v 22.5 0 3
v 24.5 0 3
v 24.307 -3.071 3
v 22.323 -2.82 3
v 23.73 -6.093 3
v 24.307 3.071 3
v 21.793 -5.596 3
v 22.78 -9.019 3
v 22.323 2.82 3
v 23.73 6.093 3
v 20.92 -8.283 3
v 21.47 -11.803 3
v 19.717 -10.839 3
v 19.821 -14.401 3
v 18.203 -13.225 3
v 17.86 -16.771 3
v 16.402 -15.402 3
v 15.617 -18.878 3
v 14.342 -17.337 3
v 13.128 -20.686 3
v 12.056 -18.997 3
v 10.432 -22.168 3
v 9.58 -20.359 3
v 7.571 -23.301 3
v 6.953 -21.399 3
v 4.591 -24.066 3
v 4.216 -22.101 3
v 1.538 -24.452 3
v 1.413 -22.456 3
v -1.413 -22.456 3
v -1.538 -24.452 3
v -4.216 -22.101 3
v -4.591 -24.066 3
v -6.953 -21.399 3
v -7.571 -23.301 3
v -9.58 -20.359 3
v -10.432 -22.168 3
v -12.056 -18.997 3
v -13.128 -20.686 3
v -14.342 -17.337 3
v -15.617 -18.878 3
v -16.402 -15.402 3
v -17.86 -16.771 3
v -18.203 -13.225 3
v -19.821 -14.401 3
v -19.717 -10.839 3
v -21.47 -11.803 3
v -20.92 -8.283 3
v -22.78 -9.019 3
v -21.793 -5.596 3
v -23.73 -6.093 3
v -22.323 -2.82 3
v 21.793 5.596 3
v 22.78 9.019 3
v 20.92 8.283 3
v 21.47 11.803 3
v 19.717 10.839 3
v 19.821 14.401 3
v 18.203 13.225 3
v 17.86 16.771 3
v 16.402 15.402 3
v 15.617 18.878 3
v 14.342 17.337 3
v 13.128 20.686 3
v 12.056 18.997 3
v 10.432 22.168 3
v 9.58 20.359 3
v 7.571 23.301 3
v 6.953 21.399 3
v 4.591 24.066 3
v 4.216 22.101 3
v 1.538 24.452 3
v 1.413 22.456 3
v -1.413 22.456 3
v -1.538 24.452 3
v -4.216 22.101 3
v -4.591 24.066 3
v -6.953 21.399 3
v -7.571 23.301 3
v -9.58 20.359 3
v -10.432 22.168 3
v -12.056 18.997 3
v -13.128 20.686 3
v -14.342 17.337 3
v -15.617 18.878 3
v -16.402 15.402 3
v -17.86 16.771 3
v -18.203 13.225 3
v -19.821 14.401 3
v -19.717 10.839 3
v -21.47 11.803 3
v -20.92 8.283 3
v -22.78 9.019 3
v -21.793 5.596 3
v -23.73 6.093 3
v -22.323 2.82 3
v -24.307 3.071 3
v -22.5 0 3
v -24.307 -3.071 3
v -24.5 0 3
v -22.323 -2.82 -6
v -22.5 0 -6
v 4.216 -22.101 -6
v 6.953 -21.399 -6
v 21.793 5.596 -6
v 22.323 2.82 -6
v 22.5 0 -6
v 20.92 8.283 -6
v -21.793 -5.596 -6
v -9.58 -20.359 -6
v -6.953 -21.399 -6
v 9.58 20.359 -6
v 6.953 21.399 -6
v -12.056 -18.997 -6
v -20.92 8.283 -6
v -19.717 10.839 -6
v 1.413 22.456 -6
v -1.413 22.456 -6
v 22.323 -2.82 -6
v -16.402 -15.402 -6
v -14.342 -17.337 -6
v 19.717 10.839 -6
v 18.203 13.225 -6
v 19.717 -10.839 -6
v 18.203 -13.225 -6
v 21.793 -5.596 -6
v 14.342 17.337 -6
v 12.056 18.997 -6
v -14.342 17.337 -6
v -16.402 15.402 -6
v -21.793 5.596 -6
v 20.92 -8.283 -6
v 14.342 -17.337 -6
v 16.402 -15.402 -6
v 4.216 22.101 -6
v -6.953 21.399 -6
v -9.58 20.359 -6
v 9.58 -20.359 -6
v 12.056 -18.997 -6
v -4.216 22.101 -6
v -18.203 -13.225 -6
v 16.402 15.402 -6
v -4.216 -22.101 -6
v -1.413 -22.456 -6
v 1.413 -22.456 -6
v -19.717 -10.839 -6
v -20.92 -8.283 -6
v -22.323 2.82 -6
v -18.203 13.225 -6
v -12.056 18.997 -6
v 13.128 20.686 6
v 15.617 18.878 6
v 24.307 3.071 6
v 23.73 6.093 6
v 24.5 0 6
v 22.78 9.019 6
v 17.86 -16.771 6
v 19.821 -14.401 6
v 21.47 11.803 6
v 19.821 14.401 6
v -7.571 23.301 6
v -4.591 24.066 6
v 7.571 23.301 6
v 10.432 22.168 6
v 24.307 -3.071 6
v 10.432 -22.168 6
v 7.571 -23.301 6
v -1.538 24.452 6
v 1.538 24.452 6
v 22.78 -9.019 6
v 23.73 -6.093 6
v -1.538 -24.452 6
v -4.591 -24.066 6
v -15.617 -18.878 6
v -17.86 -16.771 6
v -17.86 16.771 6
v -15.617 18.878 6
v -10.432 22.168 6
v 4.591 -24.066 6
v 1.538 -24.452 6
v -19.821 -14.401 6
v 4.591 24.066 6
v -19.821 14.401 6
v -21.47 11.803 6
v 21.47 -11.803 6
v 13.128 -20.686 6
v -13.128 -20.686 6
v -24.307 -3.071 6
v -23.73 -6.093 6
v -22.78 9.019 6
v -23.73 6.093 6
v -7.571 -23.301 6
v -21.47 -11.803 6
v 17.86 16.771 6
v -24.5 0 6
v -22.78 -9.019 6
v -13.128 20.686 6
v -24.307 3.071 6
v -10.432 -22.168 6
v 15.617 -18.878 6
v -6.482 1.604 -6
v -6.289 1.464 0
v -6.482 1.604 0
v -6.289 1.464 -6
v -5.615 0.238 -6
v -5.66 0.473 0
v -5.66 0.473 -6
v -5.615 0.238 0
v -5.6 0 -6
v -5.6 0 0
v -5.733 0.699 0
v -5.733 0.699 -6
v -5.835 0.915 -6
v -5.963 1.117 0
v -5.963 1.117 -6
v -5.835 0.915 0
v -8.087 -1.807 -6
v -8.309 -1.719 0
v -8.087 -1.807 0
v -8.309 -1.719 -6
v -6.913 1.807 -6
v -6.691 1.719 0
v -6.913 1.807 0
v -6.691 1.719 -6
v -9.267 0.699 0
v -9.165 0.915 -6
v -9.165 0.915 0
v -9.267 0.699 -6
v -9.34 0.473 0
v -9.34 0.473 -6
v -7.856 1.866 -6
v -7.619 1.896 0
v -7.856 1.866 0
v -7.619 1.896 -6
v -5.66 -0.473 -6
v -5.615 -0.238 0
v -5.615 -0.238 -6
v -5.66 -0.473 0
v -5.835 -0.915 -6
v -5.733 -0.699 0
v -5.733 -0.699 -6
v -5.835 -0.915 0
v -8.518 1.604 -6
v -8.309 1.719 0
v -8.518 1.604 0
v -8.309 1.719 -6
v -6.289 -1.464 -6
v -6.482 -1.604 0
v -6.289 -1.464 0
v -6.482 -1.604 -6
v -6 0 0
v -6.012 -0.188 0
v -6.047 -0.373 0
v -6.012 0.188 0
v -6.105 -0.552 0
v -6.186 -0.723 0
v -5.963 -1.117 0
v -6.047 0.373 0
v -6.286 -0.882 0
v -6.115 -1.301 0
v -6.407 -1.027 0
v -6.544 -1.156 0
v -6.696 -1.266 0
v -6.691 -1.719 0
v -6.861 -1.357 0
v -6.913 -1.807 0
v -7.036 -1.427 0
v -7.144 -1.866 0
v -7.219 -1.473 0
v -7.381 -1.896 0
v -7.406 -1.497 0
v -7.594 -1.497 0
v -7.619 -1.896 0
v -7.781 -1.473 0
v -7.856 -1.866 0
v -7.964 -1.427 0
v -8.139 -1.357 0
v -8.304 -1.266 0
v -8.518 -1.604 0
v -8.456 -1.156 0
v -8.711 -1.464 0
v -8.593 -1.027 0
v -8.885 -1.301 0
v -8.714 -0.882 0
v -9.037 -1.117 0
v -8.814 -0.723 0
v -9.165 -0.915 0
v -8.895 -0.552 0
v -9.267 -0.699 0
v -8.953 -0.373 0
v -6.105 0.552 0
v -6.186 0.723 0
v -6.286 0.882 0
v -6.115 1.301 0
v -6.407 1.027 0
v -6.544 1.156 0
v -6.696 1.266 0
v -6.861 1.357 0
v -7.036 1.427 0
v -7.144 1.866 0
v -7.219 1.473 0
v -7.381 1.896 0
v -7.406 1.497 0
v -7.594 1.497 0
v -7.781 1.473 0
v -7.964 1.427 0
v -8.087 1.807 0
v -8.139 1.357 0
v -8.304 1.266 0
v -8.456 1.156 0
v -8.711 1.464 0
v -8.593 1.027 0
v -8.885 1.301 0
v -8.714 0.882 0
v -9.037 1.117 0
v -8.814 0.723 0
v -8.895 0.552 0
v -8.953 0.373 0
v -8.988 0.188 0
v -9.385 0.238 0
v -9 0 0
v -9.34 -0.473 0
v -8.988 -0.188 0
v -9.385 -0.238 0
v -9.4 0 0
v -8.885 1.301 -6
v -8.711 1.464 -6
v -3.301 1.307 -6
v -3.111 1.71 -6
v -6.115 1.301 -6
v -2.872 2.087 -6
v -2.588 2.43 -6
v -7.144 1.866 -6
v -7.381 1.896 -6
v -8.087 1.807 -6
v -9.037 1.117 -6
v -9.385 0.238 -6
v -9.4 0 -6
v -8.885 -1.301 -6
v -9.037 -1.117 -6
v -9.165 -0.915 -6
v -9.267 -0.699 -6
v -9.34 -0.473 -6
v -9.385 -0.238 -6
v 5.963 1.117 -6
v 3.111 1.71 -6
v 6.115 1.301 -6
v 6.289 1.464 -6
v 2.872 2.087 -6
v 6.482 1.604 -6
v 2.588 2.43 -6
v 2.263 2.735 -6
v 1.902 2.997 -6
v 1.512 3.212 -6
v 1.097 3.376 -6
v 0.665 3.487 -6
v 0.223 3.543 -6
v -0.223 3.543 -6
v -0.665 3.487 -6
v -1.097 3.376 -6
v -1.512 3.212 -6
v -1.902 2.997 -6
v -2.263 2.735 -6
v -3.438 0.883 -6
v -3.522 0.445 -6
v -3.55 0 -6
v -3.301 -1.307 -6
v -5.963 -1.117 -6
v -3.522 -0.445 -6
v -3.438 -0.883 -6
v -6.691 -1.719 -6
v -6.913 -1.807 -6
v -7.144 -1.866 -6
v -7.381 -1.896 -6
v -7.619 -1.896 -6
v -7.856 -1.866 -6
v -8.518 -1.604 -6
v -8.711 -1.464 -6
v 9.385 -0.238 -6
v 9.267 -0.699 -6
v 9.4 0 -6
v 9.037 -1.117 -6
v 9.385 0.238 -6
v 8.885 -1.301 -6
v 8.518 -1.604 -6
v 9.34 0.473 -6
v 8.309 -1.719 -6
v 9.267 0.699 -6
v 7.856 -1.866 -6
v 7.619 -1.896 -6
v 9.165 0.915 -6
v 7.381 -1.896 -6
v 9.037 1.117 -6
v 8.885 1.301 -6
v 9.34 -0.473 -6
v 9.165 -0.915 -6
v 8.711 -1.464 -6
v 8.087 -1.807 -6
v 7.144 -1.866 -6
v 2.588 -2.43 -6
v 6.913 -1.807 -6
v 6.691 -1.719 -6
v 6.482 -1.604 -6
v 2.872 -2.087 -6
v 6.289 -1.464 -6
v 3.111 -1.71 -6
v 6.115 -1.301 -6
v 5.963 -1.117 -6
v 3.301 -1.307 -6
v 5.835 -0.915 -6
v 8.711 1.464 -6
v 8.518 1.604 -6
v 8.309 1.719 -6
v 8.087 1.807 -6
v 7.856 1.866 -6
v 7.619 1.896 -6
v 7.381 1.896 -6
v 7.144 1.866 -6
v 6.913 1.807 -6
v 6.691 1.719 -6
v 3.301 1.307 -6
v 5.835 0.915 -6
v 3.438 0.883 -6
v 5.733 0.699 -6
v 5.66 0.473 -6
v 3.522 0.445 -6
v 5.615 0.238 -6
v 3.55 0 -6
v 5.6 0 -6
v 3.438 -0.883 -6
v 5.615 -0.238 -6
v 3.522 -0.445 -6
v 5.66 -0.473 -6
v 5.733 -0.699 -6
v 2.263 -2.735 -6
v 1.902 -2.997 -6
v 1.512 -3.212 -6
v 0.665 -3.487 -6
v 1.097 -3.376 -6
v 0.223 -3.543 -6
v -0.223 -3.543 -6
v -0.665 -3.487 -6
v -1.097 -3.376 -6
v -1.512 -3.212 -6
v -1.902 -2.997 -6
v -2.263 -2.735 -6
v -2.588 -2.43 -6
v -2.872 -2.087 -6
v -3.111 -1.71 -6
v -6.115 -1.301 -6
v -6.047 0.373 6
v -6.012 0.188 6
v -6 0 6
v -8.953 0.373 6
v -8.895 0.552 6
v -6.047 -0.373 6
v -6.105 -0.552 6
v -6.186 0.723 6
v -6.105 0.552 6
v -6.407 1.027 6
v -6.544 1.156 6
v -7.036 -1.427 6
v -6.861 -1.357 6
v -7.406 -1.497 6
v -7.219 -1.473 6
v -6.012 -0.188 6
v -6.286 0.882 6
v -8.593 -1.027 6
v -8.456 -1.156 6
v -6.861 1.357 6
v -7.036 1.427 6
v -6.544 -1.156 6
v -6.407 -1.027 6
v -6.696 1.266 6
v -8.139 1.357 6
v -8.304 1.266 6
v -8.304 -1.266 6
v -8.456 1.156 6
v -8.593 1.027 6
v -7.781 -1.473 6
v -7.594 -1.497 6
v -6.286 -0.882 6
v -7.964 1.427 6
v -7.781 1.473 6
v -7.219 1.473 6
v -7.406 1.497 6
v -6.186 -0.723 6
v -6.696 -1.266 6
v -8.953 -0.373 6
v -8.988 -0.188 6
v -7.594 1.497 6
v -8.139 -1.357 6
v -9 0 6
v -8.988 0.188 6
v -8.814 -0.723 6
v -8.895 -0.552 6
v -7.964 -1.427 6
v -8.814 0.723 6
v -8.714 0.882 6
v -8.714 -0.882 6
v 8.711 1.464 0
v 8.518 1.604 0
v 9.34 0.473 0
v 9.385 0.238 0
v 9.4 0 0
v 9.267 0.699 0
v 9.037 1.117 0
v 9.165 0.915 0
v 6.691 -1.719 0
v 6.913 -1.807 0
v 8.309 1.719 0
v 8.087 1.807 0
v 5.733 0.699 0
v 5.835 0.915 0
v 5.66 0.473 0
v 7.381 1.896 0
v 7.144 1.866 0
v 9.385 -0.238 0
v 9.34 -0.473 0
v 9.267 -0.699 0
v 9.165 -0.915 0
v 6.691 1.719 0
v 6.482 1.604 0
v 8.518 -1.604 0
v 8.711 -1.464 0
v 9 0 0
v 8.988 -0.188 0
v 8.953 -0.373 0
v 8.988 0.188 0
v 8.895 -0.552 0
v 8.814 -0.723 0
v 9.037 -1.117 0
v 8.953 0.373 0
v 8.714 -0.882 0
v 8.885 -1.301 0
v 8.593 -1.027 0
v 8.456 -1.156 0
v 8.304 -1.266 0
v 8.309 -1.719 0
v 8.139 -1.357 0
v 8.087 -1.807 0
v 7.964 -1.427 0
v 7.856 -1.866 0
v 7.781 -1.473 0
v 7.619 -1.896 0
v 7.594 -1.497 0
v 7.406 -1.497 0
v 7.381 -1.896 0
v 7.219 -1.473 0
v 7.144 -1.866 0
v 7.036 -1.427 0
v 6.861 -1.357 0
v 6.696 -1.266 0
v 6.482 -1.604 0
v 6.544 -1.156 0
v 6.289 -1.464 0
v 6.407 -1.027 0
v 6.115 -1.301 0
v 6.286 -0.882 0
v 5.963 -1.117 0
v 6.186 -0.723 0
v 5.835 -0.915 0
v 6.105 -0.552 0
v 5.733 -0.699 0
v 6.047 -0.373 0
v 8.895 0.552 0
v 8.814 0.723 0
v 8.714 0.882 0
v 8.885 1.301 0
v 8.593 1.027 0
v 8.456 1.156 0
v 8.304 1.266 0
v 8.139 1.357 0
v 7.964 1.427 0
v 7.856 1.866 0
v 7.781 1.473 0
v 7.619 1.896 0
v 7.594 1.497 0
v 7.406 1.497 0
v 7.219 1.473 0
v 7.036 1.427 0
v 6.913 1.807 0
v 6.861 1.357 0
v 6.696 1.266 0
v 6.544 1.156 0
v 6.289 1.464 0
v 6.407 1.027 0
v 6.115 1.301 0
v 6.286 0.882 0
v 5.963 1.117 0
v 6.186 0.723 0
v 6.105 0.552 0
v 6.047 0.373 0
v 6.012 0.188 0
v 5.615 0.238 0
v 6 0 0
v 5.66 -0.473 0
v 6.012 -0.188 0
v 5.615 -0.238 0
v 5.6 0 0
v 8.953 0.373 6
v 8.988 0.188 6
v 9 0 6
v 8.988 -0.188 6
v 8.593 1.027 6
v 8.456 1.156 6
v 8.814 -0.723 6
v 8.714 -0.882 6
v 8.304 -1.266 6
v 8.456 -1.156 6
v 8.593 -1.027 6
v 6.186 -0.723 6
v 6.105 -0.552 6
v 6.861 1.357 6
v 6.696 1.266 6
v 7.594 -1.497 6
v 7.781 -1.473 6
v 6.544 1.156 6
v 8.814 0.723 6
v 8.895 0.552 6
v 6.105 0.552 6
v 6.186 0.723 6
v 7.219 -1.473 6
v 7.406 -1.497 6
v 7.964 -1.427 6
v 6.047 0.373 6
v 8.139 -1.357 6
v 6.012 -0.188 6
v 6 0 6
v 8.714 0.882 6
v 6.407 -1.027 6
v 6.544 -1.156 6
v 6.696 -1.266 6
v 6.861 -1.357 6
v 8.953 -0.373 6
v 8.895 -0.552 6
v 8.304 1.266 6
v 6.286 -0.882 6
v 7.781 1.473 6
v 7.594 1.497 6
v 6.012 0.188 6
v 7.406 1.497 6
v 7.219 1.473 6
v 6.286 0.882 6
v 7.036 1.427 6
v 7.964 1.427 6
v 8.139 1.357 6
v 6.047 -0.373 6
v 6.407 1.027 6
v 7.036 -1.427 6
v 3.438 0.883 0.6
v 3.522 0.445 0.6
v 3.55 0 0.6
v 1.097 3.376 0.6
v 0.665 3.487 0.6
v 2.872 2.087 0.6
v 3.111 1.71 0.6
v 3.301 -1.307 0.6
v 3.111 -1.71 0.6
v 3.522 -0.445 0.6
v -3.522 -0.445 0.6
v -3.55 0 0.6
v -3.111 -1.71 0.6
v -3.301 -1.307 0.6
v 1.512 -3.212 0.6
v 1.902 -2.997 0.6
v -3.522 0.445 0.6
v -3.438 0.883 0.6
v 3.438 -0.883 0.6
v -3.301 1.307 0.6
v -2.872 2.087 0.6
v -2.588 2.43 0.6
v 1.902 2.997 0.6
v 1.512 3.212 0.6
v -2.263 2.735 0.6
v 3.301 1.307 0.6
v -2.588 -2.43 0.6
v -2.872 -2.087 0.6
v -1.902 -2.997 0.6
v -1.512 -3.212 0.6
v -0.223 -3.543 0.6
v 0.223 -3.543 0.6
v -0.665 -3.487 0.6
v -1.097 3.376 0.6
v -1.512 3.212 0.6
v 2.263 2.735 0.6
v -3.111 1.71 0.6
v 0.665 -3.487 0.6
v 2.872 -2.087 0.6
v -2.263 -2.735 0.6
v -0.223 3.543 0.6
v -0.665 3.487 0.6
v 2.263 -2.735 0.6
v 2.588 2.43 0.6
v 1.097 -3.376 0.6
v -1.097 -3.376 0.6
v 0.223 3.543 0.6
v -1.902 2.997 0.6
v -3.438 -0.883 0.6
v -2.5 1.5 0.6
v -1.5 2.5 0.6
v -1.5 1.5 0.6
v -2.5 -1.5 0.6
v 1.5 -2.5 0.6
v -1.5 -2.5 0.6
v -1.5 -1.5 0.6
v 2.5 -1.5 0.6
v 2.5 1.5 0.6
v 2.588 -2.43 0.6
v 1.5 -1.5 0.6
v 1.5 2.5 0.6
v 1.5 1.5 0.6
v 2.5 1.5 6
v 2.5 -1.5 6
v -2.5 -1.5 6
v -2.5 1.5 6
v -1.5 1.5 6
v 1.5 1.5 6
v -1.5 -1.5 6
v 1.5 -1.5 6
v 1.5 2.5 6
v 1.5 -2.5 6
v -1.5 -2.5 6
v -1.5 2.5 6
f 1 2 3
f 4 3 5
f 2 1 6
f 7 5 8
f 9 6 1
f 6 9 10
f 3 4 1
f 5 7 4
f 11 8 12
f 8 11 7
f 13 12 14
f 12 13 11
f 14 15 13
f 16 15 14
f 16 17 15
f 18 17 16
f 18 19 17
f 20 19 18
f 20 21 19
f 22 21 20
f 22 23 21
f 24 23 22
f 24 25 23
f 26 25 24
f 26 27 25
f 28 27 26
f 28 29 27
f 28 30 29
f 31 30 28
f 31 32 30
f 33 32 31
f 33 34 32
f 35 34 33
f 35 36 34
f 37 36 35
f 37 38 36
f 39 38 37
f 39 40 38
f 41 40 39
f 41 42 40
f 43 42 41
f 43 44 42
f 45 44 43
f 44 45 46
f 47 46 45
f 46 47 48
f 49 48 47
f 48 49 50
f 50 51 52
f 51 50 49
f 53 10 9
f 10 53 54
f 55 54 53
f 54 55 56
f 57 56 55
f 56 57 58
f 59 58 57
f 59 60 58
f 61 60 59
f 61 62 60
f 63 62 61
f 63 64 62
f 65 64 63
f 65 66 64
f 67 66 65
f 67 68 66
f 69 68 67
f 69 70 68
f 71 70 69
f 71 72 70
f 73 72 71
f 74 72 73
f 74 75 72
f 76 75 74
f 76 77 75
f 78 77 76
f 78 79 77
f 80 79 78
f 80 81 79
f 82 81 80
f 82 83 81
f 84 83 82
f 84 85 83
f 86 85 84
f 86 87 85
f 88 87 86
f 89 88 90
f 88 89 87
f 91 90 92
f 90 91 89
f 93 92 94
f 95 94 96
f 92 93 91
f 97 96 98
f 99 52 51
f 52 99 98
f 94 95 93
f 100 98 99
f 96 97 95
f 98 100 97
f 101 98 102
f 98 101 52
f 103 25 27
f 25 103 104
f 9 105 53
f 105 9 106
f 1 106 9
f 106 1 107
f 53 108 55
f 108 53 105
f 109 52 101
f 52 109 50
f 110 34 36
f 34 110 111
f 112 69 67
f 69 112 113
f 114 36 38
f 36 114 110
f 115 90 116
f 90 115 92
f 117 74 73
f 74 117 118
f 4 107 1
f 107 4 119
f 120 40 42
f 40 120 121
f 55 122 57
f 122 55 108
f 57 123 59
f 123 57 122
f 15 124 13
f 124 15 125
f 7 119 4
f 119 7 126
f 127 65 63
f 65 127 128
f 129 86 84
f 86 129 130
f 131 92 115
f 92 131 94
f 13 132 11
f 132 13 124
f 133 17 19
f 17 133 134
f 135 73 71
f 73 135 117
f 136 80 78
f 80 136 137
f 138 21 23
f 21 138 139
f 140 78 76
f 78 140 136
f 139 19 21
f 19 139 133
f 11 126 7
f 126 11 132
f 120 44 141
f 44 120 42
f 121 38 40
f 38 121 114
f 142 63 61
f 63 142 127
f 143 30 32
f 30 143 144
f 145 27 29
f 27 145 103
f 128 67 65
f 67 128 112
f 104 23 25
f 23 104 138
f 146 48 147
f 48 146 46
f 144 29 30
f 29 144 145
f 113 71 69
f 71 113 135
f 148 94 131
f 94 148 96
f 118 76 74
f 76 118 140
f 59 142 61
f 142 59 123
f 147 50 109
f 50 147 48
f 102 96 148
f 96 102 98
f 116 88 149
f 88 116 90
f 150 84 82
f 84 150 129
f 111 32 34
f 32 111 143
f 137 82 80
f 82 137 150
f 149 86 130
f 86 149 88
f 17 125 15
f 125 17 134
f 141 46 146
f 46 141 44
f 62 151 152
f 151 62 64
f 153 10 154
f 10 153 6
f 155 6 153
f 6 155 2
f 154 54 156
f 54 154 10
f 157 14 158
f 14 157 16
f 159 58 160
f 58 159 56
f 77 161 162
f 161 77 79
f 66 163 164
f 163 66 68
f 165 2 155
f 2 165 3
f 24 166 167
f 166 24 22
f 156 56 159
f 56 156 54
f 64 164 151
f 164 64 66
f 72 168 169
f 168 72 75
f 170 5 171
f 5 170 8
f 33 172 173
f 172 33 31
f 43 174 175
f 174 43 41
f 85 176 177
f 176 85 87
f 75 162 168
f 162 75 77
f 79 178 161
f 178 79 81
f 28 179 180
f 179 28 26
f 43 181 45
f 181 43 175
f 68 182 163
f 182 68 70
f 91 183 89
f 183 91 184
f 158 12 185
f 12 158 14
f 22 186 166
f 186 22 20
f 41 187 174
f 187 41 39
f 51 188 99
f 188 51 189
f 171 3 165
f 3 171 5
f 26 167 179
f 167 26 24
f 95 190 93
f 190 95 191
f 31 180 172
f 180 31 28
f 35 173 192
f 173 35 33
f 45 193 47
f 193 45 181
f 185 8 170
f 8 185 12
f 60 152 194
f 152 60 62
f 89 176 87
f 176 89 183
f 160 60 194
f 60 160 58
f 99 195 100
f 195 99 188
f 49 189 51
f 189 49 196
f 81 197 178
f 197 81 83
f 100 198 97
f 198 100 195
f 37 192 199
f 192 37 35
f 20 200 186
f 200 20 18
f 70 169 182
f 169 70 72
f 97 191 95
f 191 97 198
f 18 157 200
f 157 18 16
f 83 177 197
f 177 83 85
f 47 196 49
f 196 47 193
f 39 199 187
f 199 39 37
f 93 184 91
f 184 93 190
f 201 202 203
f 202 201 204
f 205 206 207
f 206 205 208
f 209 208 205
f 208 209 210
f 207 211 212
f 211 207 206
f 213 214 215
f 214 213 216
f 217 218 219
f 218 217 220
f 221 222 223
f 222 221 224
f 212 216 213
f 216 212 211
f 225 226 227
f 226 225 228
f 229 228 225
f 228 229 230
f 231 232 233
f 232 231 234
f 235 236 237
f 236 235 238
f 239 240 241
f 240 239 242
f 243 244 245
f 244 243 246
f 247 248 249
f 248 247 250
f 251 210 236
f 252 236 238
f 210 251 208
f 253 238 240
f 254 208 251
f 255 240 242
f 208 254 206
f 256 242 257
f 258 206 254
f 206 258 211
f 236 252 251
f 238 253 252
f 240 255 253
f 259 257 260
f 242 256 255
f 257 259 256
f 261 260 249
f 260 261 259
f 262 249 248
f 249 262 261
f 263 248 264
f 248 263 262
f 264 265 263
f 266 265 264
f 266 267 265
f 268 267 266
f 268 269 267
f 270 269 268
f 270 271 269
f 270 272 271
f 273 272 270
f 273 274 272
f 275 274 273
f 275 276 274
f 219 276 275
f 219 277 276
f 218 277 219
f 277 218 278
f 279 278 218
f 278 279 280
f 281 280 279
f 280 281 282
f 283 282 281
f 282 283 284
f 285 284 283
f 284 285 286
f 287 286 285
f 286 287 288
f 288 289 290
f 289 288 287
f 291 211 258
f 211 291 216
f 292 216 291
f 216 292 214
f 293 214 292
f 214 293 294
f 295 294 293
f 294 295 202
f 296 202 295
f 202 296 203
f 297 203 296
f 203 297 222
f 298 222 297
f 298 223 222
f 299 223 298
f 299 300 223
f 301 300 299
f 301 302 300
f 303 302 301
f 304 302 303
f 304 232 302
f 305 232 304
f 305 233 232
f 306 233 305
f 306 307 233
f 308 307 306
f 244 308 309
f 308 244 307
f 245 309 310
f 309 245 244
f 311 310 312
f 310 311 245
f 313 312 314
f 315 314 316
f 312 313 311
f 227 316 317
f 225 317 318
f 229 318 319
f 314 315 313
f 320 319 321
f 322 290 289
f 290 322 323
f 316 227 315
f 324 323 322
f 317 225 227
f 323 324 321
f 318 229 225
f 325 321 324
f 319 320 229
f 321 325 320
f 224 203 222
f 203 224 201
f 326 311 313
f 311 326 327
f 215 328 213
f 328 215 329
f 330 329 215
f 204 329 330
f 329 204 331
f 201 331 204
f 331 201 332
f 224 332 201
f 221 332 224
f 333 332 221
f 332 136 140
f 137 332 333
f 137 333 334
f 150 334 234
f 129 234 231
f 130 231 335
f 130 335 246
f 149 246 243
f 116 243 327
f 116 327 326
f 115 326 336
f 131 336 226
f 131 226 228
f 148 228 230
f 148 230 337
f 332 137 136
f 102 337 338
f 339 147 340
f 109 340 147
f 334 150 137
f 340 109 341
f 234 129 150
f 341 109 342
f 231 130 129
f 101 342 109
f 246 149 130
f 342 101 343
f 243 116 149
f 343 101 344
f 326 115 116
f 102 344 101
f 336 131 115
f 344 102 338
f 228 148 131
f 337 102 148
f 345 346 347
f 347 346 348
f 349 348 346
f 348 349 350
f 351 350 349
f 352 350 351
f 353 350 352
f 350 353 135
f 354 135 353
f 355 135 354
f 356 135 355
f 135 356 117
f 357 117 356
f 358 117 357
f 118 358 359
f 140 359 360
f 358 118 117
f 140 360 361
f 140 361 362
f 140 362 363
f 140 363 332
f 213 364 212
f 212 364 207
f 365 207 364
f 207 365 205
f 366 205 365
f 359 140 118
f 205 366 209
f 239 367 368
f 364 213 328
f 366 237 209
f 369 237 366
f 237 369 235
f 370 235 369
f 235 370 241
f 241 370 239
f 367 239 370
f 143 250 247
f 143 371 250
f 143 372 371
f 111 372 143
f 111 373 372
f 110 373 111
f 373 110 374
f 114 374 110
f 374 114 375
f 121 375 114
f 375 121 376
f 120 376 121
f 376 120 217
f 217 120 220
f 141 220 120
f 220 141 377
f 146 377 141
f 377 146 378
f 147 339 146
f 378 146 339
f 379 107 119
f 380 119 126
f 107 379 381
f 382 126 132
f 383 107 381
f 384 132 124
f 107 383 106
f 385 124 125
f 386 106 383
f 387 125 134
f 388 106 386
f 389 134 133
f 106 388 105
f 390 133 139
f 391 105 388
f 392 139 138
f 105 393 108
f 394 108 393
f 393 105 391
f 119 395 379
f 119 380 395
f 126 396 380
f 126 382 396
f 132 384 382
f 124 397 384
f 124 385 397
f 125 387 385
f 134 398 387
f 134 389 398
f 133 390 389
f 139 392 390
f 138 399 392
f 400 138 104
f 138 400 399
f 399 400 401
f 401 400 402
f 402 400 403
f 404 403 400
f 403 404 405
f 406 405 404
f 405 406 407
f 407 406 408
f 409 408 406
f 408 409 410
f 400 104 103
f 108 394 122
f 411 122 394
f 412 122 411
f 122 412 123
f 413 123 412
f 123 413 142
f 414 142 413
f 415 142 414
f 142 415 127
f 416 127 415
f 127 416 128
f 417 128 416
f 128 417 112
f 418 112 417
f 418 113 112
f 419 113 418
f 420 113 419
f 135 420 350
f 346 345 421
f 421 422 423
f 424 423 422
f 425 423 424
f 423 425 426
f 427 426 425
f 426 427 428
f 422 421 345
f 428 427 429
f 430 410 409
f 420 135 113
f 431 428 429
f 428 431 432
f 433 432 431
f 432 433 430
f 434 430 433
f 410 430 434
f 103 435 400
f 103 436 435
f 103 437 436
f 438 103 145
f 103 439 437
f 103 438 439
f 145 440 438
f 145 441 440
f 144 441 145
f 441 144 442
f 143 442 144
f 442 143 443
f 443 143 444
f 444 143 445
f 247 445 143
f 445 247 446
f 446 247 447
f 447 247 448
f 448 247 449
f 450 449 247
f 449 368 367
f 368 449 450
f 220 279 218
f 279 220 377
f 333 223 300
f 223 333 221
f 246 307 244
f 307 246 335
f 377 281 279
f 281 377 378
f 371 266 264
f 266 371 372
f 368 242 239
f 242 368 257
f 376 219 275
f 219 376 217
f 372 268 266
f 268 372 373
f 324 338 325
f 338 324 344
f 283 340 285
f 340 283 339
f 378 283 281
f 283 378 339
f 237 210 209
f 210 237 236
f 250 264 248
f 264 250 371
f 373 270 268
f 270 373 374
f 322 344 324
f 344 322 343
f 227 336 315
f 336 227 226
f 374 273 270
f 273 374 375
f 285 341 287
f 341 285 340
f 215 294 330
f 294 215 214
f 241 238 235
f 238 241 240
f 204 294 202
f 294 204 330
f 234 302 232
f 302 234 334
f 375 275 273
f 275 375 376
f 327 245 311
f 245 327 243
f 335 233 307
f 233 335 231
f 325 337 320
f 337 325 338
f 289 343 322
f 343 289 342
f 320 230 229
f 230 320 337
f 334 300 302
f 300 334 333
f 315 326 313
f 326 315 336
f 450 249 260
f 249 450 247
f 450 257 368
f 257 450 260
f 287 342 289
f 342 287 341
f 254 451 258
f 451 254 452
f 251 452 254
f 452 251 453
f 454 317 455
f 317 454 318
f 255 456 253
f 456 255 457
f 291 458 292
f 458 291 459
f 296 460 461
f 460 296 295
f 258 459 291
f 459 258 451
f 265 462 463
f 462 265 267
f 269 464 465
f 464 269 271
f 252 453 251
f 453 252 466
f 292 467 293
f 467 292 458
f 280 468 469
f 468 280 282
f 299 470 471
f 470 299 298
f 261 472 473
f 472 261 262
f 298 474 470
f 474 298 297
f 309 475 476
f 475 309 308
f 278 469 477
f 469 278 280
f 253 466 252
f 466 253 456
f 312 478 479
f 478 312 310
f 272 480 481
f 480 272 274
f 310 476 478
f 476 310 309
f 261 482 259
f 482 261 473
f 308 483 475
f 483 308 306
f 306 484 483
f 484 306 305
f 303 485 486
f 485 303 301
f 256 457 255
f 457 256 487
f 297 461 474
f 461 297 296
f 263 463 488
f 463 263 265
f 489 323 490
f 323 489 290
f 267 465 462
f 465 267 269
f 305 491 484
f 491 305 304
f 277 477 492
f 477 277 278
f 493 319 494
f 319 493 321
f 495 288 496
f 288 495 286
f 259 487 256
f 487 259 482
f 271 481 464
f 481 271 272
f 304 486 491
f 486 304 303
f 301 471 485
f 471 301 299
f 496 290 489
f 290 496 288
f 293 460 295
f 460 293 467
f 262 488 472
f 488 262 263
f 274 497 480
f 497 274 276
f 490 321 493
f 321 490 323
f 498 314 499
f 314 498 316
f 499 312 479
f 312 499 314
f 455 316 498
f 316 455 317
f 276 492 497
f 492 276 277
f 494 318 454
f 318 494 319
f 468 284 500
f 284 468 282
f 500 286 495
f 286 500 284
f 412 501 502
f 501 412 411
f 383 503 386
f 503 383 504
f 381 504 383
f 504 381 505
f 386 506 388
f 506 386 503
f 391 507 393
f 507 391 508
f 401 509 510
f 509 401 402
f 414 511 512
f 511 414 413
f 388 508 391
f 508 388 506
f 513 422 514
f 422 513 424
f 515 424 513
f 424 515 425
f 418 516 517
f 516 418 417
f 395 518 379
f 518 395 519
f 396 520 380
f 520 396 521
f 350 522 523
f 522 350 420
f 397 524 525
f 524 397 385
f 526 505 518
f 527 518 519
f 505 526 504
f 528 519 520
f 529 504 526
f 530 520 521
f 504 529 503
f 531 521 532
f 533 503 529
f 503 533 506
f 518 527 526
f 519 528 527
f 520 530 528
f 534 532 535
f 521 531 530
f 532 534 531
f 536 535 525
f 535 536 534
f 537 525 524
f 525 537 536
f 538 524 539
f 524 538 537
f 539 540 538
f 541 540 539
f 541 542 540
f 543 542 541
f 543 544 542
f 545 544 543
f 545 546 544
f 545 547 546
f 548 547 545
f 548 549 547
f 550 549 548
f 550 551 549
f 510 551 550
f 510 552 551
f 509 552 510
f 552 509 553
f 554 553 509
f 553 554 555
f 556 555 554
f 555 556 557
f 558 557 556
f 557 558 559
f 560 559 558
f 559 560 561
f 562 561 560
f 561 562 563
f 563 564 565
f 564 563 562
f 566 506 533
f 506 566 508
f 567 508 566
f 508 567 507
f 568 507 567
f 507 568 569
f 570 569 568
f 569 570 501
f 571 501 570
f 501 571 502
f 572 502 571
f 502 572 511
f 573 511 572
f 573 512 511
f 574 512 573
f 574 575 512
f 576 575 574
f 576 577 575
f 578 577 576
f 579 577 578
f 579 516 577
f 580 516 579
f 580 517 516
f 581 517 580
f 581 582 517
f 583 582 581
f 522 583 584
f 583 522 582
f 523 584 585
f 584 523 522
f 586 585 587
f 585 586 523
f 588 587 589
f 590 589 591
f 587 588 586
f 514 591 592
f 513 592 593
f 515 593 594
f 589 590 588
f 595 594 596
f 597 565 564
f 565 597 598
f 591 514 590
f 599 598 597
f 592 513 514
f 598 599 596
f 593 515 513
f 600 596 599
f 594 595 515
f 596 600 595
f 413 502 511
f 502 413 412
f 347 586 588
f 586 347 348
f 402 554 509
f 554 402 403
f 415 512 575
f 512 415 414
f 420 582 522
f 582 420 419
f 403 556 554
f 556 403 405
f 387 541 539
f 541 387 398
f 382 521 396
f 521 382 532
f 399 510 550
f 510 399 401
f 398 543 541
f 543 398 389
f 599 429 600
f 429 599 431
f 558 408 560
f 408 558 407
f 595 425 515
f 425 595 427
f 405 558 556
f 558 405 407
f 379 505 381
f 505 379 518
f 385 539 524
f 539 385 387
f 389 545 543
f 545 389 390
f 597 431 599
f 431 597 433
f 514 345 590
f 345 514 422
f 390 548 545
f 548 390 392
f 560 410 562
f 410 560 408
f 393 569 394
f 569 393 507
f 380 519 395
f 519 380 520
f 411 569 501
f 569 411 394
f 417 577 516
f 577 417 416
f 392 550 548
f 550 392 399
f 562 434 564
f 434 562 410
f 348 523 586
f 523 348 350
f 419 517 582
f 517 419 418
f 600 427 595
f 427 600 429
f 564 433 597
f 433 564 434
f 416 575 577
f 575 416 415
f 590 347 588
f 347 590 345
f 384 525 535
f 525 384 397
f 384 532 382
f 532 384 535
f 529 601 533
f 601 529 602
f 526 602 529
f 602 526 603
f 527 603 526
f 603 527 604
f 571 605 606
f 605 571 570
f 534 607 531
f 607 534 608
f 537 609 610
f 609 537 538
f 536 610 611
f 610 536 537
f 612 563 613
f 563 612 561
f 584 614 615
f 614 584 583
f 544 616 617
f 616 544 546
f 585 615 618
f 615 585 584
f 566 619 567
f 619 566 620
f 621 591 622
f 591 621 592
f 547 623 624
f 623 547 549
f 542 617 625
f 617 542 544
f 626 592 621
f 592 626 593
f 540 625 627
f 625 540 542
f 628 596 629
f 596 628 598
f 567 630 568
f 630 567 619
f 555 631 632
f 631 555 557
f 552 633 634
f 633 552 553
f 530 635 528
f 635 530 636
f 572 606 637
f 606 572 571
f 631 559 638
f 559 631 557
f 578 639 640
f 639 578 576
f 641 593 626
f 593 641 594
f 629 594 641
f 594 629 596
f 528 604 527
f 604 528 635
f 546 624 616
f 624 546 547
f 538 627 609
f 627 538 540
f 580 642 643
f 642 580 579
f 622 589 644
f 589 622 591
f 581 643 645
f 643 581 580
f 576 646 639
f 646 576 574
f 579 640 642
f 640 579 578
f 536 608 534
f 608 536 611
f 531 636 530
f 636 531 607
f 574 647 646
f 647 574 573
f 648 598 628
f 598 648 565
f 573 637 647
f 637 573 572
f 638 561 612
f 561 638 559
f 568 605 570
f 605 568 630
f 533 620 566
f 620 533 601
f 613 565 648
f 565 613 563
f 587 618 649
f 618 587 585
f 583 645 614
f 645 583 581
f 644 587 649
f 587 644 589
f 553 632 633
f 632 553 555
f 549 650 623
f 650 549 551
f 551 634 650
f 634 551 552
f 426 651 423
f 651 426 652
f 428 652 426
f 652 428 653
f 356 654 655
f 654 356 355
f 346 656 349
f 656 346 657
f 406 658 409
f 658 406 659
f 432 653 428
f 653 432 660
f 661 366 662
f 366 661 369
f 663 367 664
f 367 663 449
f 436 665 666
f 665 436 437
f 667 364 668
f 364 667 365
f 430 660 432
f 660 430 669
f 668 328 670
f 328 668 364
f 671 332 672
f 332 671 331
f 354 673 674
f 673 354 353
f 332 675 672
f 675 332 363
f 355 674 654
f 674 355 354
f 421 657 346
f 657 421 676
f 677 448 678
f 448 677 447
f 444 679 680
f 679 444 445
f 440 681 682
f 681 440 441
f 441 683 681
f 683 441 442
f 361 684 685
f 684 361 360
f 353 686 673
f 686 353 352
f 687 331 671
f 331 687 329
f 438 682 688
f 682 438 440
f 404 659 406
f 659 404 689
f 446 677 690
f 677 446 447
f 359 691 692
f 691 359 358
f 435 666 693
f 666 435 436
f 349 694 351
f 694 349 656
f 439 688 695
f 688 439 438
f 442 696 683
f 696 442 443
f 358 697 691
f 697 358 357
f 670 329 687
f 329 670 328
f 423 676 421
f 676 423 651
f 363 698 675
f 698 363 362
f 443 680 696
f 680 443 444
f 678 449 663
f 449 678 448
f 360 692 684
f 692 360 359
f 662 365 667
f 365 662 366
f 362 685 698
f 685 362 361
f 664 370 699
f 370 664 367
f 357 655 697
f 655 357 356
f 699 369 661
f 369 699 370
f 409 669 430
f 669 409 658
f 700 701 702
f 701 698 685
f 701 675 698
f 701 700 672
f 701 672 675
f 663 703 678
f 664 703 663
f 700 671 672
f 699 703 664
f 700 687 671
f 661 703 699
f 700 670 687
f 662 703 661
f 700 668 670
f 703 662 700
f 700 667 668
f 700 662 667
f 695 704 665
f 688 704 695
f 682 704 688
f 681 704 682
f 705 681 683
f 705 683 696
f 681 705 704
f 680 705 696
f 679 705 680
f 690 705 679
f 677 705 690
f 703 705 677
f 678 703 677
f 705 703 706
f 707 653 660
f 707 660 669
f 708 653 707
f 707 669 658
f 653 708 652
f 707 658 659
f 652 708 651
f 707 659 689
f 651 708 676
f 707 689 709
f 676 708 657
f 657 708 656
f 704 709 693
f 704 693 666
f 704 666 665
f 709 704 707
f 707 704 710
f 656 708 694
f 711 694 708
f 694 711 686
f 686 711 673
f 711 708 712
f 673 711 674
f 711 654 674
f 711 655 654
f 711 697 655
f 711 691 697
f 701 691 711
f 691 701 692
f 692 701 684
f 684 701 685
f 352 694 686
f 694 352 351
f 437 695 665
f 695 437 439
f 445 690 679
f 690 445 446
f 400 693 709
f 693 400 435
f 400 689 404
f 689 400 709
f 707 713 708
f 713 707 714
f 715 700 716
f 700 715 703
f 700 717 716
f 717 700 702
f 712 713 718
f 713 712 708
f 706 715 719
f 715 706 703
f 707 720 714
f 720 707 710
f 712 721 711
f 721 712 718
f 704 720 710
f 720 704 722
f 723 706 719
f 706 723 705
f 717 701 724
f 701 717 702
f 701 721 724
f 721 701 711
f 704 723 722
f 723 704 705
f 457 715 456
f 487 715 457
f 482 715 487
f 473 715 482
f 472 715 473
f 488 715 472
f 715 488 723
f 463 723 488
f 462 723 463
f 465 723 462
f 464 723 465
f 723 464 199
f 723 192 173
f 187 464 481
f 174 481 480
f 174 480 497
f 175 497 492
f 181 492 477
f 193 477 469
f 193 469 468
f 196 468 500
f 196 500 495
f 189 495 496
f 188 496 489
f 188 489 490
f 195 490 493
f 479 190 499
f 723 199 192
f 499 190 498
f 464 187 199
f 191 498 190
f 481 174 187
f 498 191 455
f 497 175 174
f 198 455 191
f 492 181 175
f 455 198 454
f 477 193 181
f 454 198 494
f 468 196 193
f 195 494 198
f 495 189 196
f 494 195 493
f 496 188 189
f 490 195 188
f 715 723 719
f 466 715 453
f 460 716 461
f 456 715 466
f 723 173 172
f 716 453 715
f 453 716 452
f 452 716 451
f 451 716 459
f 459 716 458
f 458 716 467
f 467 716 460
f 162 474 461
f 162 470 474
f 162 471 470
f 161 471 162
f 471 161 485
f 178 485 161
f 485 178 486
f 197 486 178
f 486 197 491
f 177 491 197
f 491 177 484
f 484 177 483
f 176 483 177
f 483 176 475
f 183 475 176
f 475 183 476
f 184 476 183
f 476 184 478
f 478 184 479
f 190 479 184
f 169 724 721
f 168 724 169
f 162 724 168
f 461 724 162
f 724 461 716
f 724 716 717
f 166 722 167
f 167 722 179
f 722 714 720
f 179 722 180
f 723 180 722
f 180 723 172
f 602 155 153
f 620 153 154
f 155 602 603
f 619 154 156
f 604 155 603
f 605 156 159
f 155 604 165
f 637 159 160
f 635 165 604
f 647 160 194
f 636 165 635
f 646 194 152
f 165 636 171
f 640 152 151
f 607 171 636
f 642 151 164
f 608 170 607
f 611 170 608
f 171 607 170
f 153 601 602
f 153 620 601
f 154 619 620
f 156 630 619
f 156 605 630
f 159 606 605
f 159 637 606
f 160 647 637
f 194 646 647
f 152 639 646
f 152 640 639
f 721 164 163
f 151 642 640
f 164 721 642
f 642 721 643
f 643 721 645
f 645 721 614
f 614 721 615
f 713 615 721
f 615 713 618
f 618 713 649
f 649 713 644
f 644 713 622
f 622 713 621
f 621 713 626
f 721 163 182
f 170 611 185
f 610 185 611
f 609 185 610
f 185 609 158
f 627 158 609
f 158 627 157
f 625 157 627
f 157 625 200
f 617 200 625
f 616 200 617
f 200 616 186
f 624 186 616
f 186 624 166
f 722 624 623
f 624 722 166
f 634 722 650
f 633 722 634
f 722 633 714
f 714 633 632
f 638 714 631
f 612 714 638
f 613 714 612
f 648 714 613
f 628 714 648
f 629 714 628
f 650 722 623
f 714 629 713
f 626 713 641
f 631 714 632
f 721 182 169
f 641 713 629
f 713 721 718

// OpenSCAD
$fn = 50;

difference() {
	union() {
		translate(v = [0, 0, 0]) {
			rotate(a = [0, 0, 0]) {
				difference() {
					union() {
						translate(v = [0, 0, -6.0]) {
							cylinder(h = 12, r = 24.5);
						}
					}
					union() {
						translate(v = [0, 0, 0]) {
							rotate(a = [0, 0, 0]) {
								difference() {
									union() {
										translate(v = [0, 0, -3.0]) {
											cylinder(h = 6, r = 27.5);
										}
									}
									union() {
										translate(v = [0, 0, -3.01]) {
											cylinder(h = 6.02, r = 22.5);
										}
									}
								}
							}
						}
						translate(v = [0, 0, -3]) {
							rotate(a = [0, 0, 0]) {
								difference() {
									union() {
										translate(v = [0, 0, -3.0]) {
											cylinder(h = 6, r = 27.5);
										}
									}
									union() {
										translate(v = [0, 0, -3.01]) {
											cylinder(h = 6.02, r = 22.5);
										}
									}
								}
							}
						}
						translate(v = [0, 0, -6]) {
							rotate(a = [0, 0, 0]) {
								difference() {
									union() {
										translate(v = [0, 0, -3.0]) {
											cylinder(h = 6, r = 27.5);
										}
									}
									union() {
										translate(v = [0, 0, -3.01]) {
											cylinder(h = 6.02, r = 22.5);
										}
									}
								}
							}
						}
						translate(v = [0, 0, 0]) {
							rotate(a = [0, 0, 0]) {
								difference() {
									union() {
										translate(v = [0, 0, -21.0]) {
											cylinder(h = 42, r = 25.5);
										}
									}
									union() {
										translate(v = [0, 0, -21.01]) {
											cylinder(h = 42.02, r = 24.5);
										}
									}
								}
							}
						}
						translate(v = [-30.0, -30.0, -100.0]) {
							cylinder(h = 200, r = 3.0);
						}
						translate(v = [-30.0, -15.0, -100.0]) {
							cylinder(h = 200, r = 3.0);
						}
						translate(v = [-30.0, 15.0, -100.0]) {
							cylinder(h = 200, r = 3.0);
						}
						translate(v = [-30.0, 30.0, -100.0]) {
							cylinder(h = 200, r = 3.0);
						}
						translate(v = [-15.0, -30.0, -100.0]) {
							cylinder(h = 200, r = 3.0);
						}
						translate(v = [-15.0, 30.0, -100.0]) {
							cylinder(h = 200, r = 3.0);
						}
						translate(v = [15.0, -30.0, -100.0]) {
							cylinder(h = 200, r = 3.0);
						}
						translate(v = [15.0, 30.0, -100.0]) {
							cylinder(h = 200, r = 3.0);
						}
						translate(v = [30.0, -30.0, -100.0]) {
							cylinder(h = 200, r = 3.0);
						}
						translate(v = [30.0, -15.0, -100.0]) {
							cylinder(h = 200, r = 3.0);
						}
						translate(v = [30.0, 15.0, -100.0]) {
							cylinder(h = 200, r = 3.0);
						}
						translate(v = [30.0, 30.0, -100.0]) {
							cylinder(h = 200, r = 3.0);
						}
						translate(v = [-7.5, 0, -6.0]) {
							cylinder(h = 6, r = 1.9);
						}
						translate(v = [-7.5, 0, -7.0]) {
							cylinder(h = 14, r = 1.5);
						}
						translate(v = [7.5, 0, -6.0]) {
							cylinder(h = 6, r = 1.9);
						}
						translate(v = [7.5, 0, -7.0]) {
							cylinder(h = 14, r = 1.5);
						}
						translate(v = [0, 0, -6.000000000000001]) {
							cylinder(h = 6.6, r = 3.55);
						}
						translate(v = [-2.5, -1.5, -7.0]) {
							cube(size = [5, 3, 14]);
						}
						translate(v = [-1.5, -2.5, -7.0]) {
							cube(size = [3, 5, 14]);
						}
					}
				}
			}
		}
	}
	union();
}
